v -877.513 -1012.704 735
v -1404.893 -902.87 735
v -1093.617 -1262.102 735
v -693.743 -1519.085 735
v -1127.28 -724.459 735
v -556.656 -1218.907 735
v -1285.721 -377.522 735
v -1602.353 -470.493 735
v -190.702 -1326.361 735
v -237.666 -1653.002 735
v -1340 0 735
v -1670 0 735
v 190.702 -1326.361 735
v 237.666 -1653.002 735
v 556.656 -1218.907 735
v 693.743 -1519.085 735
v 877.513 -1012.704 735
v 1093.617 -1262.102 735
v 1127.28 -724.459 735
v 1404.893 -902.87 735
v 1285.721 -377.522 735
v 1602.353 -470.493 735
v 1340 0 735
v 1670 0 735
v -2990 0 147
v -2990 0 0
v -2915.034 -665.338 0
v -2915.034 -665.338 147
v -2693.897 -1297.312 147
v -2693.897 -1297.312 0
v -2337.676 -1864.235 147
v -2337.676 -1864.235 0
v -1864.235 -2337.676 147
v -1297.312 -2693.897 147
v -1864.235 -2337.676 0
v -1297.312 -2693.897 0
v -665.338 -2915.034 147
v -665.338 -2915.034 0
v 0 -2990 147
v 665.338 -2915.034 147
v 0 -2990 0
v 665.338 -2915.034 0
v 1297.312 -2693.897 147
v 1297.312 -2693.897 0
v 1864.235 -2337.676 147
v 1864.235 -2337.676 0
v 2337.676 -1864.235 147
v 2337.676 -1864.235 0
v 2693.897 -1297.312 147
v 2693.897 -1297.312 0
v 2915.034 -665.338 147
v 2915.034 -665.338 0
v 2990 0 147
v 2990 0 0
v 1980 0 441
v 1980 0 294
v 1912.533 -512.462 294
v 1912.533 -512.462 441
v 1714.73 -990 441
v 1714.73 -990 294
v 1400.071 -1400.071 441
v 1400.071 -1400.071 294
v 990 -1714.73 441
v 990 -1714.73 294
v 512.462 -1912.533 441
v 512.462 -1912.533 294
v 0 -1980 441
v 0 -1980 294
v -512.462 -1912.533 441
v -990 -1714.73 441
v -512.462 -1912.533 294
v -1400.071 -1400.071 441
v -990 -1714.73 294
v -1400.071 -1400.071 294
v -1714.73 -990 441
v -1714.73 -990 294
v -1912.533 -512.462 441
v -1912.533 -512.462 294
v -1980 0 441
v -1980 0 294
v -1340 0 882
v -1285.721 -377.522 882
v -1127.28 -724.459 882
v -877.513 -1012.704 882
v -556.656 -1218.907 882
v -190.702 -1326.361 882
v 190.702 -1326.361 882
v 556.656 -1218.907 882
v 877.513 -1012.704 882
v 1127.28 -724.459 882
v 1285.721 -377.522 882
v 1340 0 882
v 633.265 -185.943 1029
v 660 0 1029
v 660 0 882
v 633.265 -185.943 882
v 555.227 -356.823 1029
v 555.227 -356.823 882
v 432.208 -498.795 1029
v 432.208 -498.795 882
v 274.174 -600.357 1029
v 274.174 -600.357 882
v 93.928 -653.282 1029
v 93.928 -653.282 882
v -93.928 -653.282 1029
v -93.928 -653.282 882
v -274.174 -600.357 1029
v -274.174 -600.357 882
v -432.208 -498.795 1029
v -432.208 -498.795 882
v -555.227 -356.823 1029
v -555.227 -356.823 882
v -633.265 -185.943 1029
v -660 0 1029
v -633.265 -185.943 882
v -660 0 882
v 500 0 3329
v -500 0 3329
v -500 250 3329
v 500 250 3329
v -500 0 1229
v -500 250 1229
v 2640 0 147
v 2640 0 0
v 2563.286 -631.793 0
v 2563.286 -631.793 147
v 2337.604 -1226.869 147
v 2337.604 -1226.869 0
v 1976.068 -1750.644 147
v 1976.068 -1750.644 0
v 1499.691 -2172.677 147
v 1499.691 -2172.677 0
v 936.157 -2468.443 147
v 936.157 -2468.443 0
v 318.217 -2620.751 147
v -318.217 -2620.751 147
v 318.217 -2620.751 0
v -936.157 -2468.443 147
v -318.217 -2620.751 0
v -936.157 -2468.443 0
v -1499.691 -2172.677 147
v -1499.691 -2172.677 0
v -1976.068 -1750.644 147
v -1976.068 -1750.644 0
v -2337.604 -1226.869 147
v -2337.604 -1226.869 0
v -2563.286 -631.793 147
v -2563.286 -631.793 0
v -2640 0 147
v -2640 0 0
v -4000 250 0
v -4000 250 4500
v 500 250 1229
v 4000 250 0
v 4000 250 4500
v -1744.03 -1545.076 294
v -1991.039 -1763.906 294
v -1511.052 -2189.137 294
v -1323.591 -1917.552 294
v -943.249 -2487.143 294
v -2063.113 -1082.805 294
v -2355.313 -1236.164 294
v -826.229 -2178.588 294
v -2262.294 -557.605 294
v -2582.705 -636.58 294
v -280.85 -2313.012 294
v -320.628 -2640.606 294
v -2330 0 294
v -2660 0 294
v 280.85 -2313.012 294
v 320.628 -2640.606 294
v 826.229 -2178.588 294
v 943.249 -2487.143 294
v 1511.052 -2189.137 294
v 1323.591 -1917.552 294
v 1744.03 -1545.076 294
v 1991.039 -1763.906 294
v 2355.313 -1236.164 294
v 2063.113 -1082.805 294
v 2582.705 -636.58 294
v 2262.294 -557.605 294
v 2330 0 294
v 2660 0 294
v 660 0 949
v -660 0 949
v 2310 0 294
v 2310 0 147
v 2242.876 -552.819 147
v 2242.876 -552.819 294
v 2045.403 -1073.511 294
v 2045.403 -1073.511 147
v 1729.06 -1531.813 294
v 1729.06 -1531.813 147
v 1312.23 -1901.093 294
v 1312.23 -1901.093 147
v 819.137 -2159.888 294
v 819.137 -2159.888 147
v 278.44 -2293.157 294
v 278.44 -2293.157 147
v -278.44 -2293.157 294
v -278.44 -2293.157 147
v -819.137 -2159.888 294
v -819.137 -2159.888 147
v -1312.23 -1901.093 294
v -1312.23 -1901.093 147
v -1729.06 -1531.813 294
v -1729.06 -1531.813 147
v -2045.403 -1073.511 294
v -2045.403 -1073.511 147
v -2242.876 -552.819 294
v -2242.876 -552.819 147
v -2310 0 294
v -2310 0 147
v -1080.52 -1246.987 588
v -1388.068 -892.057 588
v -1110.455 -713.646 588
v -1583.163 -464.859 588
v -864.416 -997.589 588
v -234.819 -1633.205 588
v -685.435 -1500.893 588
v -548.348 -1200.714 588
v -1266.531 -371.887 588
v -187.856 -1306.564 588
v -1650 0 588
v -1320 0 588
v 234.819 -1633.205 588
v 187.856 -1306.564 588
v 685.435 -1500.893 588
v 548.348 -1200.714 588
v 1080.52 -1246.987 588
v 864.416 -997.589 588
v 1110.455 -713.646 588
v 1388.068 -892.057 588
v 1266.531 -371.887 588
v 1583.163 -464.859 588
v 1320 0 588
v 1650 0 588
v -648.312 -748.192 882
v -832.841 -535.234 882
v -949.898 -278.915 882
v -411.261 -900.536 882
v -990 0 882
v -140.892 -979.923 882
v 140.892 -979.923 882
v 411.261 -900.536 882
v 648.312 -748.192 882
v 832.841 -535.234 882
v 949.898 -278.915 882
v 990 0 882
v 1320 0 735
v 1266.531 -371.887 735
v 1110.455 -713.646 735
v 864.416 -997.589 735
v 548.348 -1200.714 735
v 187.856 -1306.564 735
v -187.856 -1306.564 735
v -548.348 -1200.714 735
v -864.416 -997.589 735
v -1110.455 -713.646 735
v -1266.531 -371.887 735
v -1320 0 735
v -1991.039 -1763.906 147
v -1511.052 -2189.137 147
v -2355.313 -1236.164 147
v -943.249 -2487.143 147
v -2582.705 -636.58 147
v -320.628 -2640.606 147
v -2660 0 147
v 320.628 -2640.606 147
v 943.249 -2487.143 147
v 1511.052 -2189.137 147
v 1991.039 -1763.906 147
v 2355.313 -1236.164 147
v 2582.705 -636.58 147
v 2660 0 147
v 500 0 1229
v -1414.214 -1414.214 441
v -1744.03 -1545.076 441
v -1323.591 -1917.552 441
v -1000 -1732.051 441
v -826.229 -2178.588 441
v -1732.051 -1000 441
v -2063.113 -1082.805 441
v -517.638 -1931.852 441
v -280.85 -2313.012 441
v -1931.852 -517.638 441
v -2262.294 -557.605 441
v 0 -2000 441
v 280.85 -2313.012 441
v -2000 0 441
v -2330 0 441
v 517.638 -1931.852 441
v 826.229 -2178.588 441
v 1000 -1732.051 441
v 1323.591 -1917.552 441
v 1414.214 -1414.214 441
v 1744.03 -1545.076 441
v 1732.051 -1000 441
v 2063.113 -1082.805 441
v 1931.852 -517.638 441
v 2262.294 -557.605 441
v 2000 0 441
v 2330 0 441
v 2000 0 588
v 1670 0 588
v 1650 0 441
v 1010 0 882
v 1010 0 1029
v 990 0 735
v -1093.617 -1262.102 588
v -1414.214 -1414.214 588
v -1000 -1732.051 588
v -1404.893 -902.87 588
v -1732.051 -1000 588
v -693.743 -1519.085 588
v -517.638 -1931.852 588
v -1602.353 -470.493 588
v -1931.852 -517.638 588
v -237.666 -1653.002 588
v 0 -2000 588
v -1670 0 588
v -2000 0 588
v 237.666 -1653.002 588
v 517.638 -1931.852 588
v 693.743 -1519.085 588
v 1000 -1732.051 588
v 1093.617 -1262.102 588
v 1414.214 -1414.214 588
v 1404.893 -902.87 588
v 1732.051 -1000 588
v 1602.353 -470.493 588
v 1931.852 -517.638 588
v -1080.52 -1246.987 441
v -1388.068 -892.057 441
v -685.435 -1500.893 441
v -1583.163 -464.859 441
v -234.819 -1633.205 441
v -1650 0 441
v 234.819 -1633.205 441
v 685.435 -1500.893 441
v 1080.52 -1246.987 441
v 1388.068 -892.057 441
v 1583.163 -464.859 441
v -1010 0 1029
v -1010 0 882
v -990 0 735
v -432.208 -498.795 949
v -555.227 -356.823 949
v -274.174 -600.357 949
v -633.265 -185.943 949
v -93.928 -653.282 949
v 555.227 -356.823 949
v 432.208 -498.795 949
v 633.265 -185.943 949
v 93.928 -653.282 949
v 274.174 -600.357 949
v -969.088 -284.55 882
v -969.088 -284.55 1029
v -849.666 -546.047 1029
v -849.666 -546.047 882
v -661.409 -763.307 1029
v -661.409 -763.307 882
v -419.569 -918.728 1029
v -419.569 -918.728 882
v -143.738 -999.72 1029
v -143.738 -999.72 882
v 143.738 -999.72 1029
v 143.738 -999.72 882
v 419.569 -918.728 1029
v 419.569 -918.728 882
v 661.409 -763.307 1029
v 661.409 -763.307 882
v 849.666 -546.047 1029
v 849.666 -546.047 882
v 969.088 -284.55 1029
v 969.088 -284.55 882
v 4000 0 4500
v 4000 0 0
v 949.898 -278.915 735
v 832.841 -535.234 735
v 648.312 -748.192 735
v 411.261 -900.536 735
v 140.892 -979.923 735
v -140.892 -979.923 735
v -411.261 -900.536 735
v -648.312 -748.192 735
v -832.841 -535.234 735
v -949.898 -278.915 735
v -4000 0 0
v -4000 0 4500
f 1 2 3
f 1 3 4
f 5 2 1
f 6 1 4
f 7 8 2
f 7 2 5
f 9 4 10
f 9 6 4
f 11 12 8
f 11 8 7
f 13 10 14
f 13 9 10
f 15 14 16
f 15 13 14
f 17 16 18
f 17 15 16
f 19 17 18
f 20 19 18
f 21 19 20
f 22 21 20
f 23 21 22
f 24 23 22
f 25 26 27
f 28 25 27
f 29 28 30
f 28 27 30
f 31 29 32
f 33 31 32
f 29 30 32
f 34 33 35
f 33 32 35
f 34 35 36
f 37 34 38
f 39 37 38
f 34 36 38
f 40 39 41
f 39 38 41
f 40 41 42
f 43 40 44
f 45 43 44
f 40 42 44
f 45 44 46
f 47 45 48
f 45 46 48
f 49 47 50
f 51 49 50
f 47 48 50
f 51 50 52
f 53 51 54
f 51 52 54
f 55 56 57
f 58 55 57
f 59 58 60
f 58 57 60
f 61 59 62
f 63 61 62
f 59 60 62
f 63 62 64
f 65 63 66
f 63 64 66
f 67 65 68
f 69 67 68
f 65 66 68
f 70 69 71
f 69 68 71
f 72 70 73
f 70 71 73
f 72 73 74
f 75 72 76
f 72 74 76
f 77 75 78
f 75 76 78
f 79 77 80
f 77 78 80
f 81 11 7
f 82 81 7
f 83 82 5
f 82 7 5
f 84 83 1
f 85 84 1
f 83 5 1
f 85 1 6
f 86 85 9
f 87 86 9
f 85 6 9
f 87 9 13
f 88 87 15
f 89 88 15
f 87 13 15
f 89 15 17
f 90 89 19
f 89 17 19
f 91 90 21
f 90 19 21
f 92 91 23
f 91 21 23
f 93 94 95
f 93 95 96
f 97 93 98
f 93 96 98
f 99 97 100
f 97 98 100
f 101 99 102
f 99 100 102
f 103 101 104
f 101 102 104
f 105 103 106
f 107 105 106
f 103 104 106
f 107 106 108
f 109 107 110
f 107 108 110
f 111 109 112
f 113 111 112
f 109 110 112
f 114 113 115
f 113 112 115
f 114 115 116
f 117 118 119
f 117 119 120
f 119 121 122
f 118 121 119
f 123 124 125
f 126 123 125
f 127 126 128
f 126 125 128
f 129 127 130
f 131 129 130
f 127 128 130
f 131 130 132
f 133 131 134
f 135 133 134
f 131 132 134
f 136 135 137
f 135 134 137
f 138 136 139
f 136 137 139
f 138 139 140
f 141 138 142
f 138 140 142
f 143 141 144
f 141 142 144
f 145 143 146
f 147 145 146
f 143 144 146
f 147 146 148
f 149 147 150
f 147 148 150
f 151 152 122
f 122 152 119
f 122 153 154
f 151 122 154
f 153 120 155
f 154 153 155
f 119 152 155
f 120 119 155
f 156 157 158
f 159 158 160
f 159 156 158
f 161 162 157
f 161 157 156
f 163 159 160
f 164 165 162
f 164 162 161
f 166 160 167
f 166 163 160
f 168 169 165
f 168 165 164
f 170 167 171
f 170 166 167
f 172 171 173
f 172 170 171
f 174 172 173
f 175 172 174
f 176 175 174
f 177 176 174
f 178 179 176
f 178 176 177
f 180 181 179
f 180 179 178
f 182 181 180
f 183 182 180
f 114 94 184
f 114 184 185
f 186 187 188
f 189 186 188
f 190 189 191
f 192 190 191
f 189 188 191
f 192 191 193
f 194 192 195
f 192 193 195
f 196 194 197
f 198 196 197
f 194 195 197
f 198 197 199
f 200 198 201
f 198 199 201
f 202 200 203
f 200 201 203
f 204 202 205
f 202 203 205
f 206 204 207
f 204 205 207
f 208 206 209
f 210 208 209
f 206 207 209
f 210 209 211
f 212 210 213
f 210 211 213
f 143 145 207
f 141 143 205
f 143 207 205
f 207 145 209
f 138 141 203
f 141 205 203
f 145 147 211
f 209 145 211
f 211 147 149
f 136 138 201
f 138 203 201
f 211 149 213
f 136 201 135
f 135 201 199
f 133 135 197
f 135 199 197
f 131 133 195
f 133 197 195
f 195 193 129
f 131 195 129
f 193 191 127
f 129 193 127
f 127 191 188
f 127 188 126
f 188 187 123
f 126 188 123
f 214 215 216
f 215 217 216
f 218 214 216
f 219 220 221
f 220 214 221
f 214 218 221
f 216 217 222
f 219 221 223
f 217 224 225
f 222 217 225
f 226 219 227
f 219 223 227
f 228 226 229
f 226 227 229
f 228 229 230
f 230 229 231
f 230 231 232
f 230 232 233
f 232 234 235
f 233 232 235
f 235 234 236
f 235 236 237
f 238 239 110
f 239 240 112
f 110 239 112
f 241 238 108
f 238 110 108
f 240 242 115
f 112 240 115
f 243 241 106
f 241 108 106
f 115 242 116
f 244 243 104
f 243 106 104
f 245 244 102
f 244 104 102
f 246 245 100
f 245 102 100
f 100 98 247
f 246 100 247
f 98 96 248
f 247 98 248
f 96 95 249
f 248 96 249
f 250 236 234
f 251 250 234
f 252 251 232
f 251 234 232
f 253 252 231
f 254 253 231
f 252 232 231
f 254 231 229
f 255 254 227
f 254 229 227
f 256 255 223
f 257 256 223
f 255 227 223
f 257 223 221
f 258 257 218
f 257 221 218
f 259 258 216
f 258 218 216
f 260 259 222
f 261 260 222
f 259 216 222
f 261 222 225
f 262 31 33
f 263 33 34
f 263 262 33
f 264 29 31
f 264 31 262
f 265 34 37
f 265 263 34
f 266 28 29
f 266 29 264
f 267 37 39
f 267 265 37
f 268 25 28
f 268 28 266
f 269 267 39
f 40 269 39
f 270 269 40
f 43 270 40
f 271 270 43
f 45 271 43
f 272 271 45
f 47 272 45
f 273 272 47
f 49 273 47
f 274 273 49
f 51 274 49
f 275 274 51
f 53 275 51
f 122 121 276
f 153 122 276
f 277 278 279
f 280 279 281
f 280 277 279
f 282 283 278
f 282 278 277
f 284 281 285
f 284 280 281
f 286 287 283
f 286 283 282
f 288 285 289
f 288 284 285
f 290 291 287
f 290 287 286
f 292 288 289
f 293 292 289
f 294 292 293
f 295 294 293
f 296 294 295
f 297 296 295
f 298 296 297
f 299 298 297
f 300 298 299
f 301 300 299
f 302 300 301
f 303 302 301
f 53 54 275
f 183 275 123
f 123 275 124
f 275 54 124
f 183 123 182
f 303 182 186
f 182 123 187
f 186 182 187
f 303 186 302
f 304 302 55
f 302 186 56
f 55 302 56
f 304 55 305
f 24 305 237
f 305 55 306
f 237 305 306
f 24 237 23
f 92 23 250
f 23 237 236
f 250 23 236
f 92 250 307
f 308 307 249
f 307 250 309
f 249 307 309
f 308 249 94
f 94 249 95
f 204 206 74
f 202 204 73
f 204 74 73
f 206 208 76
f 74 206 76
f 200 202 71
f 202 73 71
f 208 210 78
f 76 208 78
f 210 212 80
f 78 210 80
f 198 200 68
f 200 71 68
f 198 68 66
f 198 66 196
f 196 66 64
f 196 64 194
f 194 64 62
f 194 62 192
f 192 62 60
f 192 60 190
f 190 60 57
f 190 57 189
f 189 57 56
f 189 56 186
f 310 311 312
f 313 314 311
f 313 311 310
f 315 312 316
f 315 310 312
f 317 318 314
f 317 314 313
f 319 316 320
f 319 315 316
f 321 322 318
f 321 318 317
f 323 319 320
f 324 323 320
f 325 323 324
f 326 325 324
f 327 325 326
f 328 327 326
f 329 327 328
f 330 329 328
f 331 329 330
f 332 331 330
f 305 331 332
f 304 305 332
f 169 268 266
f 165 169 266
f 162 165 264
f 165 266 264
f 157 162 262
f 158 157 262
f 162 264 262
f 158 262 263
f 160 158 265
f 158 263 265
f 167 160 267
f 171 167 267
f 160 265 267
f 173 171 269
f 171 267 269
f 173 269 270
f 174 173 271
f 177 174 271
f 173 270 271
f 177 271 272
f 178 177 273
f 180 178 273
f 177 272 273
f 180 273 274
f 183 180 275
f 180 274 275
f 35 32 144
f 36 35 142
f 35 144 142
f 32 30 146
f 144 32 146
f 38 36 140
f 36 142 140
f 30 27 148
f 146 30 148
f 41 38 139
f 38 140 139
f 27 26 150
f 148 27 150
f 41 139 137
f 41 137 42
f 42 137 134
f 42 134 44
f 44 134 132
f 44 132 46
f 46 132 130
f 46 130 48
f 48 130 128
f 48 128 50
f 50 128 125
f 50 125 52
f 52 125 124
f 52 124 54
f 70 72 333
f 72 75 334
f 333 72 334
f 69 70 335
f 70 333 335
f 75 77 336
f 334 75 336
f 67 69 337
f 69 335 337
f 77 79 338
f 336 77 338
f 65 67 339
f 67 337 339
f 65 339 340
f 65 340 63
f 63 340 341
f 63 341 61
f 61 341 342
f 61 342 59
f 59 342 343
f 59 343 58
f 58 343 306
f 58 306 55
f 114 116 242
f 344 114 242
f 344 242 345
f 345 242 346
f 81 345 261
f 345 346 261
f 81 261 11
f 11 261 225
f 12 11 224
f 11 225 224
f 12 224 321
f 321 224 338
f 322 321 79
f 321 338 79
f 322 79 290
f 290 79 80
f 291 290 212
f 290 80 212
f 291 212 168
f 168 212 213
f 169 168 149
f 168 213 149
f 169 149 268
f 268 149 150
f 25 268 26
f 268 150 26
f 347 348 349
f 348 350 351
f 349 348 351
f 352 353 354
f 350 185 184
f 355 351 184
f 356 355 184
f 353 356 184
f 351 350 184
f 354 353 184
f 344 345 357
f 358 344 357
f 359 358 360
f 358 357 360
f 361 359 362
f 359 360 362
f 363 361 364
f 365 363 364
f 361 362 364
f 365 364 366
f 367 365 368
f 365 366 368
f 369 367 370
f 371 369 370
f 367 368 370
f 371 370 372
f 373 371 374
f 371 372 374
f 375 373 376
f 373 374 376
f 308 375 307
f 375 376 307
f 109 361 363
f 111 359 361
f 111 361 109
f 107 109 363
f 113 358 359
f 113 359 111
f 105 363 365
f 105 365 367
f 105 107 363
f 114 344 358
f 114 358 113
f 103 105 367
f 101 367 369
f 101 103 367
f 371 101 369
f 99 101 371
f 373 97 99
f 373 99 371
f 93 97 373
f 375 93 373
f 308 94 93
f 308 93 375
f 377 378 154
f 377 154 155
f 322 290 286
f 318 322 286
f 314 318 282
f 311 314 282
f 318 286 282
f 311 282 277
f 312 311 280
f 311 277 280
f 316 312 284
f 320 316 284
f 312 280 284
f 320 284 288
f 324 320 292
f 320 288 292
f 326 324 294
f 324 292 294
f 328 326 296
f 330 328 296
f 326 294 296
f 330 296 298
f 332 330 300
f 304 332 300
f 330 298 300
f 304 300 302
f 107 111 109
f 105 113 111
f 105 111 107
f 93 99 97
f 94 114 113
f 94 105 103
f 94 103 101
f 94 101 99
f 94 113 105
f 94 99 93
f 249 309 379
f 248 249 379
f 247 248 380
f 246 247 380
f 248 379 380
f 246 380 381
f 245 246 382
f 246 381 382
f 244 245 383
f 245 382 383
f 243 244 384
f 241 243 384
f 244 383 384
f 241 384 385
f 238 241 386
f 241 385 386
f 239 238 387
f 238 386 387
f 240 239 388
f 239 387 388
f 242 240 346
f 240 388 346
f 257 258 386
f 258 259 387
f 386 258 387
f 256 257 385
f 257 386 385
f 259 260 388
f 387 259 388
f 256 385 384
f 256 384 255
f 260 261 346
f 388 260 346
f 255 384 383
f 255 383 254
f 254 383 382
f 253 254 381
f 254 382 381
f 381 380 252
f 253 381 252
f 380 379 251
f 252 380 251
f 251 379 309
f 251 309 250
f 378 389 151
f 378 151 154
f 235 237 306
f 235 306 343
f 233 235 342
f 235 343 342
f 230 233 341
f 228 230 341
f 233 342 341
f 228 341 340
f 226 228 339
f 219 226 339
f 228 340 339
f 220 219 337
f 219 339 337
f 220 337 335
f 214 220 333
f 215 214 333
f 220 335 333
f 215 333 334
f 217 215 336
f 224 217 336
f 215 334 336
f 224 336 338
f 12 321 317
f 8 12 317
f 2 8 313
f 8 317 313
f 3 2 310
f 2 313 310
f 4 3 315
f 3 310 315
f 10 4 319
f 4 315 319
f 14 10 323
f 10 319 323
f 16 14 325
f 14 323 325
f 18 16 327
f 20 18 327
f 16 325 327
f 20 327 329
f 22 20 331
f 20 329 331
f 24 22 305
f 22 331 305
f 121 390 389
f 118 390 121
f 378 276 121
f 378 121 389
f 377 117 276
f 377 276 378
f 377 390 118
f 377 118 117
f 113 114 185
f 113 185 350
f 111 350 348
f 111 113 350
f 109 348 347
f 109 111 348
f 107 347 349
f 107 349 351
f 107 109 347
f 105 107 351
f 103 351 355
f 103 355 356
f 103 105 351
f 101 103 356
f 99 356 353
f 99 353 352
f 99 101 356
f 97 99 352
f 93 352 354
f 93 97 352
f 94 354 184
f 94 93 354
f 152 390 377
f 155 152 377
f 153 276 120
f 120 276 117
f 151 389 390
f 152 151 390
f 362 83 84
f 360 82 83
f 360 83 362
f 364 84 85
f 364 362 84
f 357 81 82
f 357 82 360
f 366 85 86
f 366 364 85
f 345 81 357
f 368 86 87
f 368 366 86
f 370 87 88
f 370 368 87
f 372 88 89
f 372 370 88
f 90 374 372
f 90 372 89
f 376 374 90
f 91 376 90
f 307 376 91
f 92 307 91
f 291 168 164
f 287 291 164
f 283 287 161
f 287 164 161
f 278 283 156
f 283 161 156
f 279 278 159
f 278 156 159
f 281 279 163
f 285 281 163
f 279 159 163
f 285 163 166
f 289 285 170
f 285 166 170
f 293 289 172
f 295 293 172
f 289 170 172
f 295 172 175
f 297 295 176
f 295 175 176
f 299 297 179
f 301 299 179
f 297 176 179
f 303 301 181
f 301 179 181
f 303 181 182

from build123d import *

# Parameters (mm, degrees)
F1_DEPTH  = 147
F3_DEPTH  = 147
F5_DEPTH  = 147
F7_DEPTH  = 147
F9_DEPTH  = 147
F11_DEPTH = 147
F13_DEPTH = 147
F15_DEPTH = 80
F16_W     = 8000
F16_H     = 4500
F16_W_2   = 1000
F16_H_2   = 2100
F17_DEPTH = 250


with BuildPart() as f1:
    # F0 (on Top) → F1 (new body)
    with BuildSketch(Plane.XY):
        with BuildLine():
            Line((-2640, 0), (-2990, 0))
            ThreePointArc((-2990, 0), (0, -2990), (2990, 0))
            Line((2990, 0), (2640, 0))
            ThreePointArc((2640, 0), (0, -2640), (-2640, 0))
        make_face()
    extrude(amount=F1_DEPTH)

    # F2 (on face) → F3 (join)
    with BuildSketch(Plane.XY.offset(147)):
        with BuildLine():
            Line((-2310, 0), (-2660, 0))
            ThreePointArc((-2660, 0), (0, -2660), (2660, 0))
            Line((2660, 0), (2310, 0))
            ThreePointArc((2310, 0), (0, -2310), (-2310, 0))
        make_face()
    extrude(amount=F3_DEPTH)

    # F4 (on face) → F5 (join)
    with BuildSketch(Plane.XY.offset(294)):
        with BuildLine():
            Line((-1980, 0), (-2330, 0))
            ThreePointArc((-2330, 0), (0, -2330), (2330, 0))
            Line((2330, 0), (1980, 0))
            ThreePointArc((1980, 0), (0, -1980), (-1980, 0))
        make_face()
    extrude(amount=F5_DEPTH)

    # F6 (on face) → F7 (join)
    with BuildSketch(Plane.XY.offset(441)):
        with BuildLine():
            Line((-1650, 0), (-2000, 0))
            ThreePointArc((-2000, 0), (0, -2000), (2000, 0))
            Line((2000, 0), (1650, 0))
            ThreePointArc((1650, 0), (0, -1650), (-1650, 0))
        make_face()
    extrude(amount=F7_DEPTH)

    # F8 (on face) → F9 (join)
    with BuildSketch(Plane.XY.offset(588)):
        with BuildLine():
            Line((-1320, 0), (-1670, 0))
            ThreePointArc((-1670, 0), (0, -1670), (1670, 0))
            Line((1670, 0), (1320, 0))
            ThreePointArc((1320, 0), (0, -1320), (-1320, 0))
        make_face()
    extrude(amount=F9_DEPTH)

    # F10 (on face) → F11 (join)
    with BuildSketch(Plane.XY.offset(735)):
        with BuildLine():
            Line((-990, 0), (-1340, 0))
            ThreePointArc((-1340, 0), (0, -1340), (1340, 0))
            Line((1340, 0), (990, 0))
            ThreePointArc((990, 0), (0, -990), (-990, 0))
        make_face()
    extrude(amount=F11_DEPTH)

    # F12 (on face) → F13 (join)
    with BuildSketch(Plane.XY.offset(882)):
        with BuildLine():
            Line((-660, 0), (-1010, 0))
            ThreePointArc((-1010, 0), (0, -1010), (1010, 0))
            Line((1010, 0), (660, 0))
            ThreePointArc((660, 0), (0, -660), (-660, 0))
        make_face()
    extrude(amount=F13_DEPTH)


with BuildPart() as f15:
    # F14 (on face) → F15 (new body)
    with BuildSketch(Plane.XY.offset(1029)):
        with BuildLine():
            Line((660, 0), (-660, 0))
            ThreePointArc((-660, 0), (0, -660), (660, 0))
        make_face()
    extrude(amount=-F15_DEPTH)


with BuildPart() as f17:
    # F16 (on Front) → F17 (new body)
    with BuildSketch(Plane.XZ):
        with Locations((0, 2250)):
            Rectangle(F16_W, F16_H)
        with Locations((0, 2279)):
            Rectangle(F16_W_2, F16_H_2, mode=Mode.SUBTRACT)
    extrude(amount=-F17_DEPTH)


solid = Compound([f1.part, f15.part, f17.part])
